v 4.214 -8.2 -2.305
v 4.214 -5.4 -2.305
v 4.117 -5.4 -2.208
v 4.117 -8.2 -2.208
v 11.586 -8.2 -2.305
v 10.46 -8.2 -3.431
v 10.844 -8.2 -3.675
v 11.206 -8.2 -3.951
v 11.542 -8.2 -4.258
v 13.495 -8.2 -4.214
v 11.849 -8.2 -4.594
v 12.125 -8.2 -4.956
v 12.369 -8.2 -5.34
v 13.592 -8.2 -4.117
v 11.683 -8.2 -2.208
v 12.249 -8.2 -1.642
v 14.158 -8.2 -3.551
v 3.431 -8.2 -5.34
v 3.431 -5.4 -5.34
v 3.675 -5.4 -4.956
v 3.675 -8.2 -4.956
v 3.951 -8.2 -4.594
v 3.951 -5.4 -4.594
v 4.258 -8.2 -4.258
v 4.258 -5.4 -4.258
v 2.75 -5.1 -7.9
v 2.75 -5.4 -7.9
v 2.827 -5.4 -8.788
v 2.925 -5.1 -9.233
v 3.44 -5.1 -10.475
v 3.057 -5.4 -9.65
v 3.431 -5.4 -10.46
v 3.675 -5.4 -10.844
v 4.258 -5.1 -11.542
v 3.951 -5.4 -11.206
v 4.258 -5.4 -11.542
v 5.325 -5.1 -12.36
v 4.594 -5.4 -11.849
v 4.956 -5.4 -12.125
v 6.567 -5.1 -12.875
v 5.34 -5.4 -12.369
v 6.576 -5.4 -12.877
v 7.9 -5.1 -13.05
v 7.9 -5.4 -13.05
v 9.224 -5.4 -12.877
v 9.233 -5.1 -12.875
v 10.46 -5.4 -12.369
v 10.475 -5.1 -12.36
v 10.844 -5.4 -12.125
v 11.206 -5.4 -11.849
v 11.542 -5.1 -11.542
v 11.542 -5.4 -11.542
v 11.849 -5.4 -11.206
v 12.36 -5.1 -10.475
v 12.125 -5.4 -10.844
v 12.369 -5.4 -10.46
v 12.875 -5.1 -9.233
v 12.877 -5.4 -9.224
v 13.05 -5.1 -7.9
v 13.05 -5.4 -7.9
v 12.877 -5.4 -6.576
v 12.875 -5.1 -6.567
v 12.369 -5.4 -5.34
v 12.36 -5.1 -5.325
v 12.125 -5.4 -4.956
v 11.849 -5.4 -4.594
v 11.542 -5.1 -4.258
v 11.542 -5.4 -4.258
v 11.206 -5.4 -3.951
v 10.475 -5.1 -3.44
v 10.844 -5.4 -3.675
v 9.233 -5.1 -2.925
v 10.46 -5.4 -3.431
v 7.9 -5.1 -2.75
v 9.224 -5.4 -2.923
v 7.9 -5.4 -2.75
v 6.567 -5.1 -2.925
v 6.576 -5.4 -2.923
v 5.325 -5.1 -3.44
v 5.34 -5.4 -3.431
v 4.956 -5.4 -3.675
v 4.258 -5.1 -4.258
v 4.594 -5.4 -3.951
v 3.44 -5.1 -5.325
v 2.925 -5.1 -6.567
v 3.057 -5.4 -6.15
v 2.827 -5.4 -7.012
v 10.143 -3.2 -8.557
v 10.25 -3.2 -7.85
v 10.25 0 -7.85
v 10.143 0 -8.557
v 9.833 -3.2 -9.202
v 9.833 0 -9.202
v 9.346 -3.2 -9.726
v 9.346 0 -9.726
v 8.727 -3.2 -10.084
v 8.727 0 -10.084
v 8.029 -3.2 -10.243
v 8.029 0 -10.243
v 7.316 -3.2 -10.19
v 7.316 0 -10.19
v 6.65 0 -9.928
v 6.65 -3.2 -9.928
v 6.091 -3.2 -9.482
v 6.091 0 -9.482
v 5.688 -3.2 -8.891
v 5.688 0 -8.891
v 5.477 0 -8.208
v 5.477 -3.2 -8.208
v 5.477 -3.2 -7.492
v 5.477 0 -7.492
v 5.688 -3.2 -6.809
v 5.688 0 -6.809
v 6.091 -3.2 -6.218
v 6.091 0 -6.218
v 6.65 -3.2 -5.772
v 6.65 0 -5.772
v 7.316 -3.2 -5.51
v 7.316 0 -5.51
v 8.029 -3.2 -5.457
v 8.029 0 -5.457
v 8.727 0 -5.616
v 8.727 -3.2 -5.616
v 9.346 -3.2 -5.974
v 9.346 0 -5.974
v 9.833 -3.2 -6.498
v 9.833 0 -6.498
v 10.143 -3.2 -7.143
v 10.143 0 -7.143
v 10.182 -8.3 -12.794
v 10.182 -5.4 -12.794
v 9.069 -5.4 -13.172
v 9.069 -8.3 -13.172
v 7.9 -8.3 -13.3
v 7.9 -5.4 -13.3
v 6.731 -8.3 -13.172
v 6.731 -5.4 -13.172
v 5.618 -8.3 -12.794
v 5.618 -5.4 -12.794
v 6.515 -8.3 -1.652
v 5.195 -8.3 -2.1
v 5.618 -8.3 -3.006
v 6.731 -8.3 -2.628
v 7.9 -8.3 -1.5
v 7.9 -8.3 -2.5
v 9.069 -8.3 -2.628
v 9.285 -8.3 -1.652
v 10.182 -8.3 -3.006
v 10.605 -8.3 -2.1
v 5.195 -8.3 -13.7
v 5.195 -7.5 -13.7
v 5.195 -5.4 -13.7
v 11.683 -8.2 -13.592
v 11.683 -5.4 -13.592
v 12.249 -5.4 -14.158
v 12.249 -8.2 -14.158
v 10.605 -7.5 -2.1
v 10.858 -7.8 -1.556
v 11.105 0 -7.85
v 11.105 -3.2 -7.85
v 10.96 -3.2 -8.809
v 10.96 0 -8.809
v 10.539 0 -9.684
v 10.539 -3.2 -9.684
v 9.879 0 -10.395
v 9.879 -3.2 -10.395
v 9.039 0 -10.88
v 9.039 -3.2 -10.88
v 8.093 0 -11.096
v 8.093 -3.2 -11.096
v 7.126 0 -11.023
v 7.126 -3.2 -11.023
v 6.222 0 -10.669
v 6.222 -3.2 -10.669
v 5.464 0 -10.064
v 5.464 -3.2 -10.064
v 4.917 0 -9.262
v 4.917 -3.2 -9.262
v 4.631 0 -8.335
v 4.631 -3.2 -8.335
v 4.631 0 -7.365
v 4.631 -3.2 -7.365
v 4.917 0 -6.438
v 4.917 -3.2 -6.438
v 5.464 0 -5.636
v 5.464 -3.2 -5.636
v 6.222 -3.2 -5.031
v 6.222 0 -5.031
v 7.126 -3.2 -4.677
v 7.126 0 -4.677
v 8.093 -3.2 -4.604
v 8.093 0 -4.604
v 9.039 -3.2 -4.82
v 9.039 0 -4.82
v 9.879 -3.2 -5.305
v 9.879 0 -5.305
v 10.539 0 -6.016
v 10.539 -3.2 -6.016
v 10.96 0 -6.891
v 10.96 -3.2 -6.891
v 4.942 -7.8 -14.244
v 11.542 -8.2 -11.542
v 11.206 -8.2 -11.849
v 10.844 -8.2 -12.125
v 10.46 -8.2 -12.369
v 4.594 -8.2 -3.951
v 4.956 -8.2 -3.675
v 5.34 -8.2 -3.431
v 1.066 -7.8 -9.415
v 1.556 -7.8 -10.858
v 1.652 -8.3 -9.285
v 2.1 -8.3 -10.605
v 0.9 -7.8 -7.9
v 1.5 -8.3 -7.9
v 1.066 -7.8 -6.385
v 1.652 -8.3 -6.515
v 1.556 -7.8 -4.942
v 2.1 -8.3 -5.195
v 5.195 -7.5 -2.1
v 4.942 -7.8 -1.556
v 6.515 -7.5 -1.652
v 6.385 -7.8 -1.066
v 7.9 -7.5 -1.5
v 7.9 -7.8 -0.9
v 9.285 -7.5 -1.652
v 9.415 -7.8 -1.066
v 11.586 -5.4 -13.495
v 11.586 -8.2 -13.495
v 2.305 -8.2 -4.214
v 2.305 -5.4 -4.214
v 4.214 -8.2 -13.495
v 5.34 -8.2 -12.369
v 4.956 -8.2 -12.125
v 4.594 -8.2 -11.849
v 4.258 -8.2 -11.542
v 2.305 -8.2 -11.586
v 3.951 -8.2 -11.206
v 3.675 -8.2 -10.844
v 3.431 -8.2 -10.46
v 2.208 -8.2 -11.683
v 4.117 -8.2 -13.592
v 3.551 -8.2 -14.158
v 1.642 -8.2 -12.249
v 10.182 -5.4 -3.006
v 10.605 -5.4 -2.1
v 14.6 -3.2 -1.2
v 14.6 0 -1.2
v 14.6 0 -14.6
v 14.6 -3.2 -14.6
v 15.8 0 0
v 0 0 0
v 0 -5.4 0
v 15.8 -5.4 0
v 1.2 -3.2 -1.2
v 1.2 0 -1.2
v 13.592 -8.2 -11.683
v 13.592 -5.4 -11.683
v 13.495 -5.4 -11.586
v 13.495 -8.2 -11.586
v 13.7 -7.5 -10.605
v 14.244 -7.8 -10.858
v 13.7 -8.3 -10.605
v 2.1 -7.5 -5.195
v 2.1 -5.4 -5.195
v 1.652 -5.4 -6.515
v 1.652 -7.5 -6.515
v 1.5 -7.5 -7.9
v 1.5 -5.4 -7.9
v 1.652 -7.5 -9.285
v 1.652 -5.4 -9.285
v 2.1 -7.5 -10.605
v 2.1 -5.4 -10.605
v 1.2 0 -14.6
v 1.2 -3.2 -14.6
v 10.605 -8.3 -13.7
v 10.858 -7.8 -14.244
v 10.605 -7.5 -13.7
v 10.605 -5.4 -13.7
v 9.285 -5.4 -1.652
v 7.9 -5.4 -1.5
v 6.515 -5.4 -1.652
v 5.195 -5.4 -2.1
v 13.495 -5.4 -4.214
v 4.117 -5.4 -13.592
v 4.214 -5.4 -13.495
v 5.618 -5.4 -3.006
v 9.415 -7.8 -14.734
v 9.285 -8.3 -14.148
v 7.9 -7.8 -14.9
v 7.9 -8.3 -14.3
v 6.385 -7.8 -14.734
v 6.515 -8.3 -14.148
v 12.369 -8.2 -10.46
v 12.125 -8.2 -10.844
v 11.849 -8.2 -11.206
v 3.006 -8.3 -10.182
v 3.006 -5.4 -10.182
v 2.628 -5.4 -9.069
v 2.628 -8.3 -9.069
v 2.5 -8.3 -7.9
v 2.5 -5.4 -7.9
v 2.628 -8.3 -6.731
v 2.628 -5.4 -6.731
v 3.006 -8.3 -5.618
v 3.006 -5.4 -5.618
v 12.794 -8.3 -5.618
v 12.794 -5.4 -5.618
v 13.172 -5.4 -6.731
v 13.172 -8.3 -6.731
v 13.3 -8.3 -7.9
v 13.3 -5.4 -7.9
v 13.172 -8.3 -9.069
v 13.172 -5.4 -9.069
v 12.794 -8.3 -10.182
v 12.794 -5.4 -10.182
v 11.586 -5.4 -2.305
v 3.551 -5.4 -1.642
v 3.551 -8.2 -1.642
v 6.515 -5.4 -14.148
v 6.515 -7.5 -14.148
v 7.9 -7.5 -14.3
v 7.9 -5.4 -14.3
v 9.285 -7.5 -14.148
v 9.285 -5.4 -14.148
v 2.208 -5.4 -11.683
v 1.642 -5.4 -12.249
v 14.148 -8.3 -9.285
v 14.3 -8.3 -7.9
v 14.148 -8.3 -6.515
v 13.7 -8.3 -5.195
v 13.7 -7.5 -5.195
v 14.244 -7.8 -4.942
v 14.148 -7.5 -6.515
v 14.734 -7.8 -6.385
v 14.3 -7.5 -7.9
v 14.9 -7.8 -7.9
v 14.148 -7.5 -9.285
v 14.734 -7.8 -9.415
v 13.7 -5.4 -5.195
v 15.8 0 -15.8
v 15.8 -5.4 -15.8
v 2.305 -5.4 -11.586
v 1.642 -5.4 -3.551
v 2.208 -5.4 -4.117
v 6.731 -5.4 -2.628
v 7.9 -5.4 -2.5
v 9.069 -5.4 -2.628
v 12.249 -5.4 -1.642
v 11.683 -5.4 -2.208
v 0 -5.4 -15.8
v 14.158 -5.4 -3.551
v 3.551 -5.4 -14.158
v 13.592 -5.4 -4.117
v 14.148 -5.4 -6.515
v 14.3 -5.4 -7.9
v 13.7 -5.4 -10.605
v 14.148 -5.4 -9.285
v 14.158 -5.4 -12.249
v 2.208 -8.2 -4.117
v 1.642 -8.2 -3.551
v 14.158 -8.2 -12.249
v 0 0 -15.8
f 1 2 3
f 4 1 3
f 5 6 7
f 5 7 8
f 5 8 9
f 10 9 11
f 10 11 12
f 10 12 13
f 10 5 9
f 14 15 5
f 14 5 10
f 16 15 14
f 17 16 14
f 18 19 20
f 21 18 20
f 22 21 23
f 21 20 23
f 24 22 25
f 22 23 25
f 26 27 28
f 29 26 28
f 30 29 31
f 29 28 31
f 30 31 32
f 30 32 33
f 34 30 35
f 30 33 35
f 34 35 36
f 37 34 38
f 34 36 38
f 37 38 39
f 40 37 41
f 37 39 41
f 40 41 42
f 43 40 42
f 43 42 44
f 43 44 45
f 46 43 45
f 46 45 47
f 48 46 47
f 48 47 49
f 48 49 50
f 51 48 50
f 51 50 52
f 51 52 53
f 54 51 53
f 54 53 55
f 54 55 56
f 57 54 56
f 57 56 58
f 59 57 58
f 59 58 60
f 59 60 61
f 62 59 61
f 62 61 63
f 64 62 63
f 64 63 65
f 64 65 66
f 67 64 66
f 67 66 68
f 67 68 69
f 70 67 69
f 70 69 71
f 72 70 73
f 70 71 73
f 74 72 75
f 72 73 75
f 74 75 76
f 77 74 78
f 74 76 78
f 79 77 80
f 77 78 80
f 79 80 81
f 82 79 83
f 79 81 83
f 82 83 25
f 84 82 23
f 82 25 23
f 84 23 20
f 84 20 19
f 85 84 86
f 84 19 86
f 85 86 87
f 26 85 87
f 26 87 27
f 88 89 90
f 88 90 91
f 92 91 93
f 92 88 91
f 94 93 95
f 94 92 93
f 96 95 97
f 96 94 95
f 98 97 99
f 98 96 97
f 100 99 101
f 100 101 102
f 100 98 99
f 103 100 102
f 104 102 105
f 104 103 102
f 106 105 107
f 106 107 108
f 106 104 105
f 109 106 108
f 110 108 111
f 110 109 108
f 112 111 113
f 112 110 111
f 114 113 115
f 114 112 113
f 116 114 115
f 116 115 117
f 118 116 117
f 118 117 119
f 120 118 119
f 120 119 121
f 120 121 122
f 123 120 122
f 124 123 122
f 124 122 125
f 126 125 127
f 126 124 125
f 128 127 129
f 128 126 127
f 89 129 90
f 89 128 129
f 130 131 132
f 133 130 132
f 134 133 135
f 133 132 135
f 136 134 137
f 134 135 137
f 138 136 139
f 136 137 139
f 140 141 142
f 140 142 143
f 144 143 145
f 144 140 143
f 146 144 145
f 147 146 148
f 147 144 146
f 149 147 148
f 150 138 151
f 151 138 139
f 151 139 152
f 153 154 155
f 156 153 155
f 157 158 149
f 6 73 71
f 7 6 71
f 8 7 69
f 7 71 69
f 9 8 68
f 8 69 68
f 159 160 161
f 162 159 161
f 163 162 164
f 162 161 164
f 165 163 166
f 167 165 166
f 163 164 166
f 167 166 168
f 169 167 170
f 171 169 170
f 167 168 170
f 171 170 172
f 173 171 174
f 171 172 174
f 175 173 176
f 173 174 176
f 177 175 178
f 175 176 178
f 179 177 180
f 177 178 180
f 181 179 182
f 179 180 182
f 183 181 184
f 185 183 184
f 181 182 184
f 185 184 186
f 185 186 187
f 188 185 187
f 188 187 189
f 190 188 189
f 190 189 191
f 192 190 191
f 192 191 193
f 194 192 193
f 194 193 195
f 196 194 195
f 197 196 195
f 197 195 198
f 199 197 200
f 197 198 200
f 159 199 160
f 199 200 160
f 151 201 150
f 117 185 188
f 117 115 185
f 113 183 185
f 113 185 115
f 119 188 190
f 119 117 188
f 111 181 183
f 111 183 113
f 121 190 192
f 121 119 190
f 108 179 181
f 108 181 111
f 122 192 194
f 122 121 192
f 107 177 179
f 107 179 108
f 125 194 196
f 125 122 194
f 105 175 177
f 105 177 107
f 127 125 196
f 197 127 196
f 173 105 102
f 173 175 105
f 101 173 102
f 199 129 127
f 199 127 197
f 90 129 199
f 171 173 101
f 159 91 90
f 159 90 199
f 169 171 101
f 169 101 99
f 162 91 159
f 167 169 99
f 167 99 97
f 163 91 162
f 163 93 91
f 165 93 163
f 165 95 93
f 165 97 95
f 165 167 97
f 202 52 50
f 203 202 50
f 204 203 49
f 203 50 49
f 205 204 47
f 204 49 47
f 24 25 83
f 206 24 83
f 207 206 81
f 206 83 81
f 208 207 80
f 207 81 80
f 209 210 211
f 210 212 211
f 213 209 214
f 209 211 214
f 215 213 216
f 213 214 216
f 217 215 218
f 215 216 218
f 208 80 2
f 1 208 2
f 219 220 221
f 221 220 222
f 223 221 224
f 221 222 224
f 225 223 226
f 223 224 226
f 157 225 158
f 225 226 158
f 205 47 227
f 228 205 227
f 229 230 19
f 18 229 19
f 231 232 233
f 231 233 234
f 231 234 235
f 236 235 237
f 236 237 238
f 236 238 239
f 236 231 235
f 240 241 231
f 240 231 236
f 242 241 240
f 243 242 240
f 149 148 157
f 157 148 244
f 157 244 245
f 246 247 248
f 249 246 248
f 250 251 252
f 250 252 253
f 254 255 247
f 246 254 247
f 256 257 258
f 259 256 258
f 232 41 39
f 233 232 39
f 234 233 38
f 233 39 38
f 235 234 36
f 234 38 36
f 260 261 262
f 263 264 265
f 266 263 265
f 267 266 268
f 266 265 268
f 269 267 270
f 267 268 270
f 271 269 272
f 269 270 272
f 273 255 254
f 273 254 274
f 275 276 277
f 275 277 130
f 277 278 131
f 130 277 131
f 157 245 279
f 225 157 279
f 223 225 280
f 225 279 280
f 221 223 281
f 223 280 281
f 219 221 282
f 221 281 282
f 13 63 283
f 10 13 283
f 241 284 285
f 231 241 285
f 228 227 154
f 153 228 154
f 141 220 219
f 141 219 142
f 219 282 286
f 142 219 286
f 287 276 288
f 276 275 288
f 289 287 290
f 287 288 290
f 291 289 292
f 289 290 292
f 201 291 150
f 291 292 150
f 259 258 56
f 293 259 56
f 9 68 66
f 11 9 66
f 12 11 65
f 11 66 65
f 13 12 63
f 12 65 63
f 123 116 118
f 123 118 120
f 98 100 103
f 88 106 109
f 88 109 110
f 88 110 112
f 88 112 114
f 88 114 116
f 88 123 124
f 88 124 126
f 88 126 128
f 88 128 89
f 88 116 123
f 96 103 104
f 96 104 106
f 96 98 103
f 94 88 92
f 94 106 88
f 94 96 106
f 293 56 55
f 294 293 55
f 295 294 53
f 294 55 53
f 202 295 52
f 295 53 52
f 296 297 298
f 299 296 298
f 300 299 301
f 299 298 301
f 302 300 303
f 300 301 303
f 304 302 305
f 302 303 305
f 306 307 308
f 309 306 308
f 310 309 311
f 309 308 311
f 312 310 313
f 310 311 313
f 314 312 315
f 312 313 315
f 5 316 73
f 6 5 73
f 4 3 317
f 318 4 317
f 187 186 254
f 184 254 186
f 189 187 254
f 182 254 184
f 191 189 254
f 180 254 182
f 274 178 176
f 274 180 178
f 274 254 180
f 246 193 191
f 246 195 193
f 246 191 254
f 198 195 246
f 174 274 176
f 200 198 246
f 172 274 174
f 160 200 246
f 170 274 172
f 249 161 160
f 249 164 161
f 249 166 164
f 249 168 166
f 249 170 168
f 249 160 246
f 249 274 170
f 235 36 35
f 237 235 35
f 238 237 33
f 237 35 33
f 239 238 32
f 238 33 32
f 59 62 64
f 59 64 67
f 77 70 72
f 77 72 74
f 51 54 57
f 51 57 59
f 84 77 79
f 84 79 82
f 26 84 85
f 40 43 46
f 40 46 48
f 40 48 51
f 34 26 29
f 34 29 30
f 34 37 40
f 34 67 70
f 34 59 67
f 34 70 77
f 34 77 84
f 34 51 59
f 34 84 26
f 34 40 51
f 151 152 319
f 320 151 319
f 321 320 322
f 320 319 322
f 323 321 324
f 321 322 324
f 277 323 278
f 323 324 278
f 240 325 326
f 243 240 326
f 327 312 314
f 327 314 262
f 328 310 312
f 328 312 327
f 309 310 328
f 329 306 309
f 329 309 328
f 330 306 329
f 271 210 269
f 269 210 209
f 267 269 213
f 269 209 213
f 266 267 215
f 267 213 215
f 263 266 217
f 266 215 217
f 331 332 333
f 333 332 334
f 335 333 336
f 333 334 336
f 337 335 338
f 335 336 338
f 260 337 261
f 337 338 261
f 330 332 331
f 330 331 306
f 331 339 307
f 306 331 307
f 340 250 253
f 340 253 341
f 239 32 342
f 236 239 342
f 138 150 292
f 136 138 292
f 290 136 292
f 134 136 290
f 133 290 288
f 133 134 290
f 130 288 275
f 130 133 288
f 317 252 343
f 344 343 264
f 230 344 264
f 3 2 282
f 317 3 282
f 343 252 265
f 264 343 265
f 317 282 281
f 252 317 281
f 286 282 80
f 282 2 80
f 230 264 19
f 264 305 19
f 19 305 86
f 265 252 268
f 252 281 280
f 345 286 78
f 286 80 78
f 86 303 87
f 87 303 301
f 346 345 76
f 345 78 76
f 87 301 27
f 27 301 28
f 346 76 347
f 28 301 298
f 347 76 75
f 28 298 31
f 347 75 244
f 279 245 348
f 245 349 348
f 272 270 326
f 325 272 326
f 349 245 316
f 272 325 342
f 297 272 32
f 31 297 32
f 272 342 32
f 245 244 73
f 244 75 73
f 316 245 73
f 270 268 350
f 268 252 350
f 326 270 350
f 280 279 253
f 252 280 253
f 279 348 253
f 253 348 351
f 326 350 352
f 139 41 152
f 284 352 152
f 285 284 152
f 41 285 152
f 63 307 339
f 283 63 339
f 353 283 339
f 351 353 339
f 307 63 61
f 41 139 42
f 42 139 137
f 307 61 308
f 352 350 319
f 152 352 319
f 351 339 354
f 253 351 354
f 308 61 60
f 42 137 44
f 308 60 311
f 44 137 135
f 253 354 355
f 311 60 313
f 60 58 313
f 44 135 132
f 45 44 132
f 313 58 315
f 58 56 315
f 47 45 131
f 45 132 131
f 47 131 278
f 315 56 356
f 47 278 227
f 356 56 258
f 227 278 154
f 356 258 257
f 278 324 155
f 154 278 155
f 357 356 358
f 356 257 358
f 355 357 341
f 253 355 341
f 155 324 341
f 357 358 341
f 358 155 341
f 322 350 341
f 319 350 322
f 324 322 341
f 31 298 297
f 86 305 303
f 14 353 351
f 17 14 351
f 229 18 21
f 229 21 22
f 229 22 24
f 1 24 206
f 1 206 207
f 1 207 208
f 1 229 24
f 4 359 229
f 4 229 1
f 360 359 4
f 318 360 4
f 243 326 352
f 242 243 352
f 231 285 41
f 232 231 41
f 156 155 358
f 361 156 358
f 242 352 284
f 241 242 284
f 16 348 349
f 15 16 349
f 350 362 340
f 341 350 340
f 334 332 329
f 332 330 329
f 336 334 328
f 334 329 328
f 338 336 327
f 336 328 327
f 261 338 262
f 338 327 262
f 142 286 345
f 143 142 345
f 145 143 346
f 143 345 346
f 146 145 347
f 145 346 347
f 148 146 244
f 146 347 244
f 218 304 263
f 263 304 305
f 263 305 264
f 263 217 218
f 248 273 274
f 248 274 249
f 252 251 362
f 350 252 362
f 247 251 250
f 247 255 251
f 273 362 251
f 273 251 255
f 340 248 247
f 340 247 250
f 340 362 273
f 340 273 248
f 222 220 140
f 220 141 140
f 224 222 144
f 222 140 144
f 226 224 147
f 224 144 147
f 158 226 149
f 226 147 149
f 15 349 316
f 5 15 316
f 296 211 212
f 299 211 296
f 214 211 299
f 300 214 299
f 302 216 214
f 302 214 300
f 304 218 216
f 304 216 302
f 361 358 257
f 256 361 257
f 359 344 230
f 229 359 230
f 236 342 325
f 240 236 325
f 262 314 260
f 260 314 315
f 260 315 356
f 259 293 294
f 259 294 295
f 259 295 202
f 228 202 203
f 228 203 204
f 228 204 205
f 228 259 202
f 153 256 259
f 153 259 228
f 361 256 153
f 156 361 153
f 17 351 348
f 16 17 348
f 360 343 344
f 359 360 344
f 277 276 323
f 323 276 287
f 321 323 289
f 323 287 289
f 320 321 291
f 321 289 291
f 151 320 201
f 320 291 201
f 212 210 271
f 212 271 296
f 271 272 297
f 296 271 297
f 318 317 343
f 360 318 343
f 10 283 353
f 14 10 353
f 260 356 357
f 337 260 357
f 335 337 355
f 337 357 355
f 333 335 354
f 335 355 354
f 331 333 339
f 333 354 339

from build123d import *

# Parameters (mm, degrees)
SKETCH2_W           = 15.8
SKETCH2_H           = 15.8
BOSS_EXTRUDE2_DEPTH = 5.4
SKETCH4_W           = 13.4
SKETCH4_H           = 13.4
CUT_EXTRUDE1_DEPTH  = 3.2
SKETCH7_R           = 3.255
SKETCH7_R_2         = 2.4
BOSS_EXTRUDE5_DEPTH = 3.2
SKETCH8_R           = 5.15
CUT_EXTRUDE2_DEPTH  = 0.3
BOSS_EXTRUDE8_DEPTH = 2.8
CIRPATTERN1_COUNT   = 4
BOSS_EXTRUDE9_DEPTH = 2.9
REVOLVE4_ANGLE      = 50
CIRPATTERN9_COUNT   = 4


with BuildPart() as part:
    # Sketch2 → Boss-Extrude2 (new body)
    with BuildSketch(Plane(origin=(0, 0, 0), x_dir=(1, 0, 0), z_dir=(0, 1, 0))):
        with Locations((7.9, 7.9)):
            Rectangle(SKETCH2_W, SKETCH2_H)
    extrude(amount=-BOSS_EXTRUDE2_DEPTH)

    # Sketch4 → Cut-Extrude1 (cut)
    with BuildSketch(Plane(origin=(0, 0, 0), x_dir=(1, 0, 0), z_dir=(0, 1, 0))):
        with Locations((7.9, 7.9)):
            Rectangle(SKETCH4_W, SKETCH4_H)
    extrude(amount=-CUT_EXTRUDE1_DEPTH, mode=Mode.SUBTRACT)

    # Sketch7 → Boss-Extrude5 (add)
    with BuildSketch(Plane(origin=(0, -3.2, 0), x_dir=(1, 0, 0), z_dir=(0, 1, 0))):
        with Locations((7.85, 7.85)):
            Circle(SKETCH7_R)
        with Locations((7.85, 7.85)):
            Circle(SKETCH7_R_2, mode=Mode.SUBTRACT)
    extrude(amount=BOSS_EXTRUDE5_DEPTH)

    # Sketch8 → Cut-Extrude2 (cut)
    with BuildSketch(Plane(origin=(0, -5.4, 0), x_dir=(-1, 0, 0), z_dir=(0, -1, 0))):
        with Locations((-7.9, 7.9)):
            Circle(SKETCH8_R)
    extrude(amount=-CUT_EXTRUDE2_DEPTH, mode=Mode.SUBTRACT)

    # Sketch11 → Boss-Extrude8 (add)
    with BuildSketch(Plane.XZ.offset(5.4)):
        Polygon((11.683021279, -2.207790411), (12.637615434, -3.162384566), (13.203300859, -2.596699141), (12.248706704, -1.642104986), align=None)
        with BuildLine():
            ThreePointArc((11.585853022, -2.304958669), (12.133497372, -2.706975833), (12.637615434, -3.162384566))
            Line((12.637615434, -3.162384566), (11.683021279, -2.207790411))
            Line((11.683021279, -2.207790411), (11.585853022, -2.304958669))
        make_face()
        with BuildLine():
            ThreePointArc((10.459662524, -3.431149167), (11.028098464, -3.808851017), (11.541599923, -4.258400077))
            Line((11.541599923, -4.258400077), (12.637615434, -3.162384566))
            ThreePointArc((12.637615434, -3.162384566), (12.133497372, -2.706975833), (11.585853022, -2.304958669))
            Line((11.585853022, -2.304958669), (10.459662524, -3.431149167))
        make_face()
        with BuildLine():
            Line((12.637615434, -3.162384566), (11.541599923, -4.258400077))
            ThreePointArc((11.541599923, -4.258400077), (11.991148983, -4.771901536), (12.368850833, -5.340337476))
            Line((12.368850833, -5.340337476), (13.495041331, -4.214146978))
            ThreePointArc((13.495041331, -4.214146978), (13.093024167, -3.666502628), (12.637615434, -3.162384566))
        make_face()
        with BuildLine():
            Line((13.592209589, -4.116978721), (12.637615434, -3.162384566))
            ThreePointArc((12.637615434, -3.162384566), (13.093024167, -3.666502628), (13.495041331, -4.214146978))
            Line((13.495041331, -4.214146978), (13.592209589, -4.116978721))
        make_face()
        Polygon((13.203300859, -2.596699141), (12.637615434, -3.162384566), (13.592209589, -4.116978721), (14.157895014, -3.551293296), align=None)
    boss_extrude8 = extrude(amount=BOSS_EXTRUDE8_DEPTH)

    # CirPattern1: Boss-Extrude8 ×4 about axis
    cirpattern1_axis = Axis((7.9, 0, -7.9), (0, 1, 0))
    for i in range(1, CIRPATTERN1_COUNT):
        add(boss_extrude8.rotate(cirpattern1_axis, i * 360 / CIRPATTERN1_COUNT))

    # Sketch12 → Boss-Extrude9 (add)
    with BuildSketch(Plane.XZ.offset(5.4)):
        with BuildLine():
            Line((13.700369837, -5.195243125), (12.79406205, -5.617861387))
            ThreePointArc((12.79406205, -5.617861387), (13.3, -7.9), (12.79406205, -10.182138613))
            Line((12.79406205, -10.182138613), (13.700369837, -10.604756875))
            ThreePointArc((13.700369837, -10.604756875), (14.3, -7.9), (13.700369837, -5.195243125))
        make_face()
        with BuildLine():
            Line((10.604756875, -13.700369837), (10.182138613, -12.79406205))
            ThreePointArc((10.182138613, -12.79406205), (7.9, -13.3), (5.617861387, -12.79406205))
            Line((5.617861387, -12.79406205), (5.195243125, -13.700369837))
            ThreePointArc((5.195243125, -13.700369837), (7.9, -14.3), (10.604756875, -13.700369837))
        make_face()
        with BuildLine():
            Line((2.099630163, -10.604756875), (3.00593795, -10.182138613))
            ThreePointArc((3.00593795, -10.182138613), (2.5, -7.9), (3.00593795, -5.617861387))
            Line((3.00593795, -5.617861387), (2.099630163, -5.195243125))
            ThreePointArc((2.099630163, -5.195243125), (1.5, -7.9), (2.099630163, -10.604756875))
        make_face()
        with BuildLine():
            Line((5.195243125, -2.099630163), (5.617861387, -3.00593795))
            ThreePointArc((5.617861387, -3.00593795), (7.9, -2.5), (10.182138613, -3.00593795))
            Line((10.182138613, -3.00593795), (10.604756875, -2.099630163))
            ThreePointArc((10.604756875, -2.099630163), (7.9, -1.5), (5.195243125, -2.099630163))
        make_face()
    extrude(amount=BOSS_EXTRUDE9_DEPTH)

    # Sketch26 → Revolve4 (revolve)
    with BuildSketch(Plane(origin=(4.436864492, 0, -9.514886609), x_dir=(0.906307787, 0, 0.422618262), z_dir=(-0.422618262, 0, 0.906307787))):
        Polygon((10.22114725, -7.5), (10.82114725, -7.8), (10.22114725, -8.3), align=None)
    revolve4 = revolve(axis=Axis((7.9, -5.1, -7.9), (0, 1, 0)), revolution_arc=REVOLVE4_ANGLE)

    # CirPattern9: Revolve4 ×4 about axis
    cirpattern9_axis = Axis((7.9, -5.1, -7.9), (0, -1, 0))
    for i in range(1, CIRPATTERN9_COUNT):
        add(revolve4.rotate(cirpattern9_axis, i * 360 / CIRPATTERN9_COUNT))


solid = part.part
